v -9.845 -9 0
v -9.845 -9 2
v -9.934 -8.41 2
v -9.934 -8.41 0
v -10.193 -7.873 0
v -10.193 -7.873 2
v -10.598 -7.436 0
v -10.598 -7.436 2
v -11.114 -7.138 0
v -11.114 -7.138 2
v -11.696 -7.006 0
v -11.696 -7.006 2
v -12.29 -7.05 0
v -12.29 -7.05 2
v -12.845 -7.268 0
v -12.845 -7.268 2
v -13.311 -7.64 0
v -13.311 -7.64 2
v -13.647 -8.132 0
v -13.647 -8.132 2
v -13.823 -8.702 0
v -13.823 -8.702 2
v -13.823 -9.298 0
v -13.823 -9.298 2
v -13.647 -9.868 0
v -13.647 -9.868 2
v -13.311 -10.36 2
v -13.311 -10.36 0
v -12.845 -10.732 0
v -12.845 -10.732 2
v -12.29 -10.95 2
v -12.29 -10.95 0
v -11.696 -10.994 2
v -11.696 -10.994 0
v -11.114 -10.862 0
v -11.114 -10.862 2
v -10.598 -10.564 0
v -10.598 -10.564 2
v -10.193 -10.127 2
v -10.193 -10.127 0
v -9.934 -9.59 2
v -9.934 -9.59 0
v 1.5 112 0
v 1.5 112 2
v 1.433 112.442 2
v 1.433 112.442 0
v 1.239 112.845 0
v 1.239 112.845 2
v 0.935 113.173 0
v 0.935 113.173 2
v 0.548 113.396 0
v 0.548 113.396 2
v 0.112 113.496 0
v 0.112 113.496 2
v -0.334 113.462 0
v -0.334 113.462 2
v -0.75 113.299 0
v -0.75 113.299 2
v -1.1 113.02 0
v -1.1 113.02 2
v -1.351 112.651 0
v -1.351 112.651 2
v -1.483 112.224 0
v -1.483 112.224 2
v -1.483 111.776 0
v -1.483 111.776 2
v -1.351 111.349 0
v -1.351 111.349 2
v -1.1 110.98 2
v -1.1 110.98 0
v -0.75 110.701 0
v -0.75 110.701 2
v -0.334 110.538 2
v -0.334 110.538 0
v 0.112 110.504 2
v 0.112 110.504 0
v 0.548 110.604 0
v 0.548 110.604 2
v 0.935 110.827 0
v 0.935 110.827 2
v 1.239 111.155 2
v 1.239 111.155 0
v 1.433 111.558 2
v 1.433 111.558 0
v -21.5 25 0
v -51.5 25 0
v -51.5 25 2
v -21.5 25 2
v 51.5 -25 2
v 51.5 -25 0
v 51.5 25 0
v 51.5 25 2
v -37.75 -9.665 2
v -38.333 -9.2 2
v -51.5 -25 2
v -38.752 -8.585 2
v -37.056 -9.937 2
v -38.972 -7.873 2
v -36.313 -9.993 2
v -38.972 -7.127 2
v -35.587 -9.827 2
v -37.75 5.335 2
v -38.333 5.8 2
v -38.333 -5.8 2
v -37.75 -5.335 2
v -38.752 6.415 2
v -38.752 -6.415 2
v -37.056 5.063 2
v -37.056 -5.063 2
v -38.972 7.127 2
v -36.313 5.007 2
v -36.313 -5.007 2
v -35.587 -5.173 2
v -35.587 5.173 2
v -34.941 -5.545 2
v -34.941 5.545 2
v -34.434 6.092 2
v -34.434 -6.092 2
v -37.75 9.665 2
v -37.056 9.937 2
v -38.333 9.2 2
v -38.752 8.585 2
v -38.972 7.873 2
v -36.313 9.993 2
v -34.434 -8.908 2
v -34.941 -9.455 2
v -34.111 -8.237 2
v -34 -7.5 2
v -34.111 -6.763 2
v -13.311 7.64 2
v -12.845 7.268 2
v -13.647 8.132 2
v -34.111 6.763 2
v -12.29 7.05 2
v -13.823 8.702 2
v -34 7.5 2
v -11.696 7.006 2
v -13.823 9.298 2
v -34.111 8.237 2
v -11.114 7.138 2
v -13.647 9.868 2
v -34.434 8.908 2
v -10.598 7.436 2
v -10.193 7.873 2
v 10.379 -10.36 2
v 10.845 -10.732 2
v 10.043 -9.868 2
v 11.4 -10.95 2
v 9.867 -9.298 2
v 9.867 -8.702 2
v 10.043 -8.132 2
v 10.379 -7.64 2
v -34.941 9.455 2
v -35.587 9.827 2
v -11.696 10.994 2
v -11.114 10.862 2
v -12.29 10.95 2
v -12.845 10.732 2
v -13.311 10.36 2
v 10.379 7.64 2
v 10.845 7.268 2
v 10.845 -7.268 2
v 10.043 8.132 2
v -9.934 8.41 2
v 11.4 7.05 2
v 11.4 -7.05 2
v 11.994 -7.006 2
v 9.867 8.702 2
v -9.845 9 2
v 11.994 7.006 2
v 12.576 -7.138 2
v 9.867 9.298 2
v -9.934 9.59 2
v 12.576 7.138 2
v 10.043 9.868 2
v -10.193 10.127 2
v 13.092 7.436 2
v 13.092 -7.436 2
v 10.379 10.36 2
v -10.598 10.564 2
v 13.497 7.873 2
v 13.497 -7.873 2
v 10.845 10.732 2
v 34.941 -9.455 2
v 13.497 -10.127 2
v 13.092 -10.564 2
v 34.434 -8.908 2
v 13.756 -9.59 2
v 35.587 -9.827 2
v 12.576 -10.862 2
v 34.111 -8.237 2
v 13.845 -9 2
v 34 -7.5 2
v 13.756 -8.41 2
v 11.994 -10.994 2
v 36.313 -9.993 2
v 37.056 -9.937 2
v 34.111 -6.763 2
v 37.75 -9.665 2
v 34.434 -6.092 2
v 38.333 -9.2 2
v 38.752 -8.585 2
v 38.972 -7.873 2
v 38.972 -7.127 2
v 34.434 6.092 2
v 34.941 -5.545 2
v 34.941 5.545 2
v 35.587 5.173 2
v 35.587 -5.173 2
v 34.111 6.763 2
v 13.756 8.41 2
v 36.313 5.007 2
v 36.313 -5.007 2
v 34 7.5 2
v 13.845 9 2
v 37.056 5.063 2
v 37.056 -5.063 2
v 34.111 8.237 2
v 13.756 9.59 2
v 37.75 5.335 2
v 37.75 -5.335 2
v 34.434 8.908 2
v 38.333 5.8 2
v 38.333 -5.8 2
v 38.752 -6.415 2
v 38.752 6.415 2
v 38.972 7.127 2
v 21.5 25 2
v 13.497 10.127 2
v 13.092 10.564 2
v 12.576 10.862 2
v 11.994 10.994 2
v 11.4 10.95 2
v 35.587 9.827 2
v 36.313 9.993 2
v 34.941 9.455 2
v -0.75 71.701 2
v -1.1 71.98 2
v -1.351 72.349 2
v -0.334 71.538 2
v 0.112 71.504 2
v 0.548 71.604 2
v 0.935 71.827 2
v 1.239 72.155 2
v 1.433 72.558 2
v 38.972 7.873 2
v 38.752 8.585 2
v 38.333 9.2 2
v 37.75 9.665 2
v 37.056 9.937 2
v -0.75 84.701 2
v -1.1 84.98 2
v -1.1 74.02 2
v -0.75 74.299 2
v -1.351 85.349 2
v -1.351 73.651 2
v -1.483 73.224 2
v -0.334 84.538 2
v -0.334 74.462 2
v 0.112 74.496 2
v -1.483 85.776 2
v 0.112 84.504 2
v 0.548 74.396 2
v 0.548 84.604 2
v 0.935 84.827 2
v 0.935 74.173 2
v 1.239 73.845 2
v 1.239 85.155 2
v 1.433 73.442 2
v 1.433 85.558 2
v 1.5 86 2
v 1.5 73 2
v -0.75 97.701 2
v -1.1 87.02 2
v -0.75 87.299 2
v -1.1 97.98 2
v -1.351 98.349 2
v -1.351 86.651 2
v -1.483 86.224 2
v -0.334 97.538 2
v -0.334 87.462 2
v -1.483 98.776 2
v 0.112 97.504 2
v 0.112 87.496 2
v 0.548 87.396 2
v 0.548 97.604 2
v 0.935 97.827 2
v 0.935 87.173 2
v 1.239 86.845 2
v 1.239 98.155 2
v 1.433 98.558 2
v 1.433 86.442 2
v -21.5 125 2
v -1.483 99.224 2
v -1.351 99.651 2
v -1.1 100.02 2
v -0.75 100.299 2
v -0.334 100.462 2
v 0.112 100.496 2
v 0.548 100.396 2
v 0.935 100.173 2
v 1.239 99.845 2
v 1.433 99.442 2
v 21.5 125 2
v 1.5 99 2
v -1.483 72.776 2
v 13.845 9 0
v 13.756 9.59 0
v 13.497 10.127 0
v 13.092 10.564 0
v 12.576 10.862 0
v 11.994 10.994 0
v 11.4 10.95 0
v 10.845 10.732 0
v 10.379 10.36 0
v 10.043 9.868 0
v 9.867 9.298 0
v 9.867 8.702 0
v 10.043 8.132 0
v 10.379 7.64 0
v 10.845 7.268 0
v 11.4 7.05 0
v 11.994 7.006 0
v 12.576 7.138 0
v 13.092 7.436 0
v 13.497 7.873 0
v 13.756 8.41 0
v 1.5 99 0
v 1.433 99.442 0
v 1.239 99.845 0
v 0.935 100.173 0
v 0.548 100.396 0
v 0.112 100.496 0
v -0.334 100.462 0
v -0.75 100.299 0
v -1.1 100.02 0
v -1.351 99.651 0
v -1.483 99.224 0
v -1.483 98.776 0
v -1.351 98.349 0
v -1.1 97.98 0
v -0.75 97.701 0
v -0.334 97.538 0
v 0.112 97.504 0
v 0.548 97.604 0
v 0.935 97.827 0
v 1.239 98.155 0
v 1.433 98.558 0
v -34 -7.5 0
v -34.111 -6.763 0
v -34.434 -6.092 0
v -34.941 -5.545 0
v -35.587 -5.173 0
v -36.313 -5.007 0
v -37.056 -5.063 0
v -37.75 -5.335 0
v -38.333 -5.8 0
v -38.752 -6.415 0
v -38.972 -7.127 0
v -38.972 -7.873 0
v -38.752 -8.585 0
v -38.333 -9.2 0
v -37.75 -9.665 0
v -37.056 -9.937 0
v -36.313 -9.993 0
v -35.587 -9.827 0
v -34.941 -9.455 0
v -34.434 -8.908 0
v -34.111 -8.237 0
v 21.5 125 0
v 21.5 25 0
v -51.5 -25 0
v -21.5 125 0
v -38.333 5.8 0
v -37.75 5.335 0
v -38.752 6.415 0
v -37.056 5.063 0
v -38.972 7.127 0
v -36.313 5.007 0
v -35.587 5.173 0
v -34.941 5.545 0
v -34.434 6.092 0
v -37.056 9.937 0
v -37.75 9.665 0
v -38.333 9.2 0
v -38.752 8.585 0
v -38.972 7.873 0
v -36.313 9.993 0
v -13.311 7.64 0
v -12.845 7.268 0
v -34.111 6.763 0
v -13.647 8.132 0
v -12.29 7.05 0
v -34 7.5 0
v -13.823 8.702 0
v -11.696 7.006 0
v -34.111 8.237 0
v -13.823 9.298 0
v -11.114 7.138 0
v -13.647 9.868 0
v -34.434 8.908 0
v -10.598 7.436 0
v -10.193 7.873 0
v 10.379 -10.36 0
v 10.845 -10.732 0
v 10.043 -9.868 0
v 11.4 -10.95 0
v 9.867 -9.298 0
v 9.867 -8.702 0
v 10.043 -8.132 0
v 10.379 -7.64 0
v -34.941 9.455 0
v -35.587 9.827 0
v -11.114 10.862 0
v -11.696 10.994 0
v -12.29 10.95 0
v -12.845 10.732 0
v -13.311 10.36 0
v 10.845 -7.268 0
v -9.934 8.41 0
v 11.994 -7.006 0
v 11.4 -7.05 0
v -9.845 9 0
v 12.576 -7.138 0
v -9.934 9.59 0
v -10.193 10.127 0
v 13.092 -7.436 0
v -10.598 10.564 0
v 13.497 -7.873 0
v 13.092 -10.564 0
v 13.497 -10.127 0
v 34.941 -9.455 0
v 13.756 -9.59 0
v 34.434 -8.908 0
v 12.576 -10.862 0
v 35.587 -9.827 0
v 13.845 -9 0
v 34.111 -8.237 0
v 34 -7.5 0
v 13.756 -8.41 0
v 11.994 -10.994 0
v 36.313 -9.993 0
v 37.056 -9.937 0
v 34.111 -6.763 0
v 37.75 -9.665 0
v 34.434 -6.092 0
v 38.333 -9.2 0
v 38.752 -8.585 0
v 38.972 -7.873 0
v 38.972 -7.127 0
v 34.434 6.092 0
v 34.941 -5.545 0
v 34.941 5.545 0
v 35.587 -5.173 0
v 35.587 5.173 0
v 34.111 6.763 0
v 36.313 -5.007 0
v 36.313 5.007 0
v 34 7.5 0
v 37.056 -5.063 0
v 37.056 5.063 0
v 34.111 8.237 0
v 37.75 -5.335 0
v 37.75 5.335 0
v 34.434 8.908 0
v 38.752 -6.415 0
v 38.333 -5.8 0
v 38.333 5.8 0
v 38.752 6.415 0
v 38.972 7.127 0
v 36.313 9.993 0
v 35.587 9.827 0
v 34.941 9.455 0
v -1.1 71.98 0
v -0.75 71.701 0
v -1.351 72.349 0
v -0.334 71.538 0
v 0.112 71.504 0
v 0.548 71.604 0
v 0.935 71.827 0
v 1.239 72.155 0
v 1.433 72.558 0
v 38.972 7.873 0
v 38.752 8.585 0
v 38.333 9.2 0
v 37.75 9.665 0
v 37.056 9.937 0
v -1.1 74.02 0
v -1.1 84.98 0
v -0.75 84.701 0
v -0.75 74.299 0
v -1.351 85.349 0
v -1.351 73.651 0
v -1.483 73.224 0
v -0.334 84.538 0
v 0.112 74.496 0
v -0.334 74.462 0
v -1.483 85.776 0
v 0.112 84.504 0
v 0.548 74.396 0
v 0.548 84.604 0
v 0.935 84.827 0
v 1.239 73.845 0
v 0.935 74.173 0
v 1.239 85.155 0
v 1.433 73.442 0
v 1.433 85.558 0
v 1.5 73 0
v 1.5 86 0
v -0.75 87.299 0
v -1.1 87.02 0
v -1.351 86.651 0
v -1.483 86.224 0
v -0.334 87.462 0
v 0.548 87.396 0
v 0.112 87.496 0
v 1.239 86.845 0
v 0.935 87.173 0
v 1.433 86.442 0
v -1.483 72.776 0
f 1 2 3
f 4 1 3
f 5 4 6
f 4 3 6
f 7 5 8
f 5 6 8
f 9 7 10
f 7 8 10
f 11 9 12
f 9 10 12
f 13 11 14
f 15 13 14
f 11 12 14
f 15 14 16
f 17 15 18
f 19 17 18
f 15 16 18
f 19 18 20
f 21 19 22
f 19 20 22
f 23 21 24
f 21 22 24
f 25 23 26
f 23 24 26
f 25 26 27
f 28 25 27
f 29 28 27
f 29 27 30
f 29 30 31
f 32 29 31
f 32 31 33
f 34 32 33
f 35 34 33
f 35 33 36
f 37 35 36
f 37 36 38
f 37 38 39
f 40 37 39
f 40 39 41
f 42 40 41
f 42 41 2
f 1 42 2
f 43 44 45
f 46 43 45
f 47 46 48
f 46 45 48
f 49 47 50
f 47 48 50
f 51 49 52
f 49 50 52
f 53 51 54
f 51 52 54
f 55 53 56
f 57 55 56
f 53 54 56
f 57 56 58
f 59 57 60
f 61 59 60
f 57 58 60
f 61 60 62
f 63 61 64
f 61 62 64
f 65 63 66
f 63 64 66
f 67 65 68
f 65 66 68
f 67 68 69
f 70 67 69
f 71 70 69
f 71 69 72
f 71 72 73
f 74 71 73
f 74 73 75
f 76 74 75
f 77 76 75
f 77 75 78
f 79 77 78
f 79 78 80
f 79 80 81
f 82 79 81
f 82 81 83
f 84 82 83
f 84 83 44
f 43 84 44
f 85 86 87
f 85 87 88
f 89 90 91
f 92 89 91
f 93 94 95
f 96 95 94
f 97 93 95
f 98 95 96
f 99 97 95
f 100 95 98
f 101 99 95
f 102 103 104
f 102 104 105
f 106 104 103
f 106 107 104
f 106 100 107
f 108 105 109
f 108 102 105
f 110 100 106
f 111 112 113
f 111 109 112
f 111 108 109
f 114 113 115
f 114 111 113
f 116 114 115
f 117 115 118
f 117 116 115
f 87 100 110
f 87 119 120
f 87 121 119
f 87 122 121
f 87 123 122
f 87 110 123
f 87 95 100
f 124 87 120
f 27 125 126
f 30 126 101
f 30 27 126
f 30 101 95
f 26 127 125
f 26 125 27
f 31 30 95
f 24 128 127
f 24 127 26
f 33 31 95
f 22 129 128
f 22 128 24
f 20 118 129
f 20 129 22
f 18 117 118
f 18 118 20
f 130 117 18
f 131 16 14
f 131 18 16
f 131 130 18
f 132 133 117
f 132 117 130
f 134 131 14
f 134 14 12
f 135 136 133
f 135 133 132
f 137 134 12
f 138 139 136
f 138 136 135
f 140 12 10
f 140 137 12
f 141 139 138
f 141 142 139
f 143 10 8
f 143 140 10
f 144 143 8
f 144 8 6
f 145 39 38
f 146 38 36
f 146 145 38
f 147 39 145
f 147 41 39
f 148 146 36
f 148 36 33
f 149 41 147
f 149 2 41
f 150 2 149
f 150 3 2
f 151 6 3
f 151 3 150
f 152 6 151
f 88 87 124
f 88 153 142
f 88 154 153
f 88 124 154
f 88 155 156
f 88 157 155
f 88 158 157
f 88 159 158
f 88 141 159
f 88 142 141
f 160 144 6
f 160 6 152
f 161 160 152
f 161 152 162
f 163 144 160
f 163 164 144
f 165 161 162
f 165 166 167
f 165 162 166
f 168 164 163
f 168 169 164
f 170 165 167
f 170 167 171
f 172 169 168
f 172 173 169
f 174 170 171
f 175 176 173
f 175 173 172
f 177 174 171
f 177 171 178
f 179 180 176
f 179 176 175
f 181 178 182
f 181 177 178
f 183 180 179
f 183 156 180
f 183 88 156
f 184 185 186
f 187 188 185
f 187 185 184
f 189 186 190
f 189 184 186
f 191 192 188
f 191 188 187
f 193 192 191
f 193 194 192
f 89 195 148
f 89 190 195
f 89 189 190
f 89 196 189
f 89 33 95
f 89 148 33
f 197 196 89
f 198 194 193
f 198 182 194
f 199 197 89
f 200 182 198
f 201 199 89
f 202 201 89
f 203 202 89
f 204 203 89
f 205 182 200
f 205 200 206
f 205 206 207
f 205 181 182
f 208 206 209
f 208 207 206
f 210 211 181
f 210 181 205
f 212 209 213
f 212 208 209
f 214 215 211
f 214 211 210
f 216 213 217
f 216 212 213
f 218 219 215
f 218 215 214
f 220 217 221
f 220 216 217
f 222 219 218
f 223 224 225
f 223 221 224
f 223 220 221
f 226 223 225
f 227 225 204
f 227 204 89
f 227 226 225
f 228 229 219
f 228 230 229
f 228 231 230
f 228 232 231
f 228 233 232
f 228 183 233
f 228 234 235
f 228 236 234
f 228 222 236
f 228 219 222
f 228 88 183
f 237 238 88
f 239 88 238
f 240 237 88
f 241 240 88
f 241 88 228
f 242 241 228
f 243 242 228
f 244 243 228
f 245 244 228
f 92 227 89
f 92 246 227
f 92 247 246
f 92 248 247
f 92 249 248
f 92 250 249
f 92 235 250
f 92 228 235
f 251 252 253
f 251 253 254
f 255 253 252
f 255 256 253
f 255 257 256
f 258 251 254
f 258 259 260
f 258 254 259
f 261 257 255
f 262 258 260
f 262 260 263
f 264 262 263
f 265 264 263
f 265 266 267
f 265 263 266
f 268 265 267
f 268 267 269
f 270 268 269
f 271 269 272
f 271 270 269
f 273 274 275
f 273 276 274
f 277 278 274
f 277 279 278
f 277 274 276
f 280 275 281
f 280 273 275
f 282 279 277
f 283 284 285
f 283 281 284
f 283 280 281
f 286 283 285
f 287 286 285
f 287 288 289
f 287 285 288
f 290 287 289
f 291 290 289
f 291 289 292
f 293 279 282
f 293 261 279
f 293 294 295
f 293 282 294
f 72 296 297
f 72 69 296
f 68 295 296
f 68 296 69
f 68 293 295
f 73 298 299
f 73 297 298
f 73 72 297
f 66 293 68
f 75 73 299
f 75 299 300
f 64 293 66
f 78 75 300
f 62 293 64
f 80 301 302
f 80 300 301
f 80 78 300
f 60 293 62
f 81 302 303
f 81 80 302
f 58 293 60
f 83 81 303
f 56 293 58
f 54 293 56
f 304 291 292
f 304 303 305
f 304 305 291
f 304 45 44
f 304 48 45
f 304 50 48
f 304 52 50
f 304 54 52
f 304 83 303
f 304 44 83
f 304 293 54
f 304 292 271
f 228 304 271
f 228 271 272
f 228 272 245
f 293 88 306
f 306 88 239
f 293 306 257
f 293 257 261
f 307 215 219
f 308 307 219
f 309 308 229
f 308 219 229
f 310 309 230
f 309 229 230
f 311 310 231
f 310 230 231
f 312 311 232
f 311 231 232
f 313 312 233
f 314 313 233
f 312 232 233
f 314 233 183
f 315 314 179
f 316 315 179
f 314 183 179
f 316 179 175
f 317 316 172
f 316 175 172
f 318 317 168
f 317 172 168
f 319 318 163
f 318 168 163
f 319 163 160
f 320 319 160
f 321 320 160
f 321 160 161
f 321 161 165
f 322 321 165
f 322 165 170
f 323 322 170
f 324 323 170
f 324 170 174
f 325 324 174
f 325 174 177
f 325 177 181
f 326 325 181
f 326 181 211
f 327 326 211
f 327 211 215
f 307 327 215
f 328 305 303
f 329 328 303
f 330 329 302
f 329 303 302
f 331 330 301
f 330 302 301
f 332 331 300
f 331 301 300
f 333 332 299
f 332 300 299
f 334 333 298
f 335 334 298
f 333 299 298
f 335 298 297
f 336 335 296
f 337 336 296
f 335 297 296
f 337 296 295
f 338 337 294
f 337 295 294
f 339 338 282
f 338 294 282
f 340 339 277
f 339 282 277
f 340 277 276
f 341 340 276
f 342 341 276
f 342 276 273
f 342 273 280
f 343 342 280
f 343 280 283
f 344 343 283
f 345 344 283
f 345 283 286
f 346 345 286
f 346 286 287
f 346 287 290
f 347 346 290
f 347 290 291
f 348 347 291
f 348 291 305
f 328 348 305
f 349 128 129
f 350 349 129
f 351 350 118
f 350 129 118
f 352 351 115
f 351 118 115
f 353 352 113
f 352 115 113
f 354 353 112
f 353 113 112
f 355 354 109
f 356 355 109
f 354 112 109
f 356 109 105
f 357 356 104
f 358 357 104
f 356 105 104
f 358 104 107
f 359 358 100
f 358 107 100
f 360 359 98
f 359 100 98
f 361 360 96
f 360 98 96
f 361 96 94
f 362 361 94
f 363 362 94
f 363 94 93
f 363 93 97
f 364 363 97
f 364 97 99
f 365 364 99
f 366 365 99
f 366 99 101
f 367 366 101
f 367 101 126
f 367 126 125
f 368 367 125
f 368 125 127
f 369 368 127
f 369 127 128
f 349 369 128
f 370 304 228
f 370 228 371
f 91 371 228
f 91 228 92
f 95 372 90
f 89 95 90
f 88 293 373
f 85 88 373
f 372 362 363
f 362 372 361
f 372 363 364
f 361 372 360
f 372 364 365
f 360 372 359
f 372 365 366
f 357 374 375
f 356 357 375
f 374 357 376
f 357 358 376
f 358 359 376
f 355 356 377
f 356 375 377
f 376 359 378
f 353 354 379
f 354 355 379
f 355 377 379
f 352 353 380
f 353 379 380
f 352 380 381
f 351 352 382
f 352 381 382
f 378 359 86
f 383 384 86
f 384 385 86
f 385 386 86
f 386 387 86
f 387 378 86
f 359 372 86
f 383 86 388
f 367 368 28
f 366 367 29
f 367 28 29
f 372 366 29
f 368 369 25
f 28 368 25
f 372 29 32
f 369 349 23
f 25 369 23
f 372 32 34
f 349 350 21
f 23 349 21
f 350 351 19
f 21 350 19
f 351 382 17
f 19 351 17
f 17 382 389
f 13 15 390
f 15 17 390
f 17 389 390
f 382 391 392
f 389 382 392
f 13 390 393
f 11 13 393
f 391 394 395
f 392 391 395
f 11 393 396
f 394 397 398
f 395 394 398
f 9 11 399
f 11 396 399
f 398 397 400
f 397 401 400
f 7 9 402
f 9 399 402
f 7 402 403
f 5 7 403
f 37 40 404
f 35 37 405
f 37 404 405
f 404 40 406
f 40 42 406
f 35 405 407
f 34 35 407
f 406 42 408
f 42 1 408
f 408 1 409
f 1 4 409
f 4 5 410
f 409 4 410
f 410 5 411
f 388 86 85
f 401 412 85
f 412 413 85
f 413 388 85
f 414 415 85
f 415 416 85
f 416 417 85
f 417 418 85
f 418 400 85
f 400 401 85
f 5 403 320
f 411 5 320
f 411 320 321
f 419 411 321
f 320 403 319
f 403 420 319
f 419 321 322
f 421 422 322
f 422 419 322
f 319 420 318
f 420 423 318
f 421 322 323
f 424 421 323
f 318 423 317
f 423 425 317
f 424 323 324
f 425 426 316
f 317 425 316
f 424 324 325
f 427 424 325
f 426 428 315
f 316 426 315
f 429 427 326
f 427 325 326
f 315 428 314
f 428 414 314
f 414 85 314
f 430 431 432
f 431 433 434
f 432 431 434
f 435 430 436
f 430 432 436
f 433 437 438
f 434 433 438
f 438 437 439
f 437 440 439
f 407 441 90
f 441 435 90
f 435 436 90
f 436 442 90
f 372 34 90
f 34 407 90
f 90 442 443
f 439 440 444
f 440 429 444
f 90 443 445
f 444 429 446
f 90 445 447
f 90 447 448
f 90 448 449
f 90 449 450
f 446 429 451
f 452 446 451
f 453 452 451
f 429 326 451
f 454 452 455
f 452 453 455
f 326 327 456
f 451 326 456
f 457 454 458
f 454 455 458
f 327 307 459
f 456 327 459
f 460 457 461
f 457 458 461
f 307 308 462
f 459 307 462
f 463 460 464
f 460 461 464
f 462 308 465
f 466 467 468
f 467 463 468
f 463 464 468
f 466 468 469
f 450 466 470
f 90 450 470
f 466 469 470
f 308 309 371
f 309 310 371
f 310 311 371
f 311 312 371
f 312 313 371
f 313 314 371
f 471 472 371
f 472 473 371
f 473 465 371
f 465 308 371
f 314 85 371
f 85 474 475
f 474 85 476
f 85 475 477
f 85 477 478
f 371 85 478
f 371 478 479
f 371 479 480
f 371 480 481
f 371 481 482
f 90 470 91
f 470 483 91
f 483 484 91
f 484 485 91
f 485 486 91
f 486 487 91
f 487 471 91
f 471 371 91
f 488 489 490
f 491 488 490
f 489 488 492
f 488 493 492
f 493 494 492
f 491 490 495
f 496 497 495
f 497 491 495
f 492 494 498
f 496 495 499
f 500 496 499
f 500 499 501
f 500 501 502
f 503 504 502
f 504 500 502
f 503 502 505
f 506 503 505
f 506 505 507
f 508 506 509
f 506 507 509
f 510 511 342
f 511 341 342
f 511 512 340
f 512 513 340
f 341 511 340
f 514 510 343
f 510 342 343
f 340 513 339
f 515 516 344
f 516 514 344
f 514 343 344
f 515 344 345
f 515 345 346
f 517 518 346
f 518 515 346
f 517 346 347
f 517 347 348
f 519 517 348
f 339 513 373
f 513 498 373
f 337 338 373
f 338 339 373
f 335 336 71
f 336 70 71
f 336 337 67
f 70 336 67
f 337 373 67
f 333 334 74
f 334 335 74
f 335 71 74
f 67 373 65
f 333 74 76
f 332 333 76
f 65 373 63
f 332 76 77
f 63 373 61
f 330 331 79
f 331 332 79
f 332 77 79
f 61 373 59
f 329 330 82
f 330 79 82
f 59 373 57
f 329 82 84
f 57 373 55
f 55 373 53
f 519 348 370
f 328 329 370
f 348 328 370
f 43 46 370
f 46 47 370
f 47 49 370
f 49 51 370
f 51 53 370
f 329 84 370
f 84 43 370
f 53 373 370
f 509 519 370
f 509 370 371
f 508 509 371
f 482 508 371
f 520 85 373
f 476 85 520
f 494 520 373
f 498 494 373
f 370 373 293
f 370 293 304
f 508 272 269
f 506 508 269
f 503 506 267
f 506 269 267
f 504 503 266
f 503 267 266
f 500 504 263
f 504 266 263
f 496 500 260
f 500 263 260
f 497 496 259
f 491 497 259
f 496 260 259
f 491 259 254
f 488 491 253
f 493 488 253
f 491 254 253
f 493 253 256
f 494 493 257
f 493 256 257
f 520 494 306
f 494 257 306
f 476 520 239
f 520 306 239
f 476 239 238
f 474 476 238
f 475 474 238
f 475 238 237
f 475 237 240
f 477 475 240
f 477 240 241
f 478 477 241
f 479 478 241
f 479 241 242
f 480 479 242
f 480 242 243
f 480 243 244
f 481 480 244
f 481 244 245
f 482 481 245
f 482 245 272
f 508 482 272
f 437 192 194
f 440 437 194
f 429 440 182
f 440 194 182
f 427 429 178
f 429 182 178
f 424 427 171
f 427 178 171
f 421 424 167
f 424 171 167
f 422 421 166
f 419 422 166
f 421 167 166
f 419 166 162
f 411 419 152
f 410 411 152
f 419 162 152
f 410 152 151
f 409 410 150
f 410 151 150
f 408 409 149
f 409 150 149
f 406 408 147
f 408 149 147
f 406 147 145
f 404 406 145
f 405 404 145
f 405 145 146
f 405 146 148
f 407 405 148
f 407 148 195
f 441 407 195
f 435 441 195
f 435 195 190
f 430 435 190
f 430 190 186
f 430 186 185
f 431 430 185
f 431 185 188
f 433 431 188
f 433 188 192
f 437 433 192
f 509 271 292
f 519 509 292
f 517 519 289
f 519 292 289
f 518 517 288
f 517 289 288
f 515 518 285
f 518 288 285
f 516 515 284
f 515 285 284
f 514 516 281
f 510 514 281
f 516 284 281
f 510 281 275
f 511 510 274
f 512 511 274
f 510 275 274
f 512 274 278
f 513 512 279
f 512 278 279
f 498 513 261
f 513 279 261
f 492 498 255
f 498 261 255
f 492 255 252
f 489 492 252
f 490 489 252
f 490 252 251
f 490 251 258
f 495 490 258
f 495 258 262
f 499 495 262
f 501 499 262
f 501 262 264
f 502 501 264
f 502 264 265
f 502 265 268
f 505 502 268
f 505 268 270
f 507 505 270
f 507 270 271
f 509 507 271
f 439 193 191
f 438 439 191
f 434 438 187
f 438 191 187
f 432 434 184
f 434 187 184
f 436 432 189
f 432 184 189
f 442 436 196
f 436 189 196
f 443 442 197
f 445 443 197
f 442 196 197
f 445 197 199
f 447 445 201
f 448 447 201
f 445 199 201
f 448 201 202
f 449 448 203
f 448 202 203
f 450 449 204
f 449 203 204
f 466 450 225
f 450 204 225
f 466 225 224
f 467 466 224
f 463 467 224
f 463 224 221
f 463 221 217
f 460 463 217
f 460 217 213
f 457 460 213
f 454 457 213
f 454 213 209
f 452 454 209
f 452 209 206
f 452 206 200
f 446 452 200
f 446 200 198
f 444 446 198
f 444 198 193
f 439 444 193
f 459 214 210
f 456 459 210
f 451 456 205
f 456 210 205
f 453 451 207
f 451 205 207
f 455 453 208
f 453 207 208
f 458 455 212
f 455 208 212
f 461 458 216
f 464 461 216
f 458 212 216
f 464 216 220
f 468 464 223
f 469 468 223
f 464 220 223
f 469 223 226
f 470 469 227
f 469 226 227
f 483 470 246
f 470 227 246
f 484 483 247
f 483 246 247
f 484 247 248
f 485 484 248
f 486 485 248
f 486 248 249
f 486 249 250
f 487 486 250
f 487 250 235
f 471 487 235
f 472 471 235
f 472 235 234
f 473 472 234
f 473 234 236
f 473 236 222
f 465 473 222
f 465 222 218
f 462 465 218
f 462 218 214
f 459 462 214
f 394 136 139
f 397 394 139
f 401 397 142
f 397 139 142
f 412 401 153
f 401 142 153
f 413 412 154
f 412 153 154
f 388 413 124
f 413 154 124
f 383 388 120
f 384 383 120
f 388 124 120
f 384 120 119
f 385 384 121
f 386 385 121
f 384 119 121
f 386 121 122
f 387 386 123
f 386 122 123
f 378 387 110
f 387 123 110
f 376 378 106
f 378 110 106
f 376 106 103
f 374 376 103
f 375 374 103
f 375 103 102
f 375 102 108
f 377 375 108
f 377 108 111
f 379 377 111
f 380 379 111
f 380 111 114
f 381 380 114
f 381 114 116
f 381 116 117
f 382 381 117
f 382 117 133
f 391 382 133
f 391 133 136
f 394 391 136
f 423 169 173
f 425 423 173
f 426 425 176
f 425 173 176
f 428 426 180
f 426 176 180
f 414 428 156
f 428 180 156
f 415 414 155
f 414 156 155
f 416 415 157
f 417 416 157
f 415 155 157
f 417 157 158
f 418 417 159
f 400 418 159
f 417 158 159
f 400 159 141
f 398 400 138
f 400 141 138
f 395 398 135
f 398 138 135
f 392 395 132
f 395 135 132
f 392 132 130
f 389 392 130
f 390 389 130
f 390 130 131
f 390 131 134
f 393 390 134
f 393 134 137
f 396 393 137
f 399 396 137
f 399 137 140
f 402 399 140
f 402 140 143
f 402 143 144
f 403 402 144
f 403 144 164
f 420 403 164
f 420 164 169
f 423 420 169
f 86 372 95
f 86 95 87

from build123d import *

# Parameters (mm, degrees)
SKETCH1_W           = 103
SKETCH1_H           = 50
BOSS_EXTRUDE1_DEPTH = 2
SKETCH3_R           = 2
CUT_EXTRUDE1_DEPTH  = 7
SKETCH4_R           = 2.5
CUT_EXTRUDE2_DEPTH  = 7
SKETCH6_W           = 43
SKETCH6_H           = 2
BOSS_EXTRUDE3_DEPTH = 100
SKETCH7_R           = 1.5
CUT_EXTRUDE3_DEPTH  = 30


with BuildPart() as part:
    # Sketch1 → Boss-Extrude1 (new body)
    with BuildSketch(Plane.XY):
        Rectangle(SKETCH1_W, SKETCH1_H)
    extrude(amount=BOSS_EXTRUDE1_DEPTH)

    # Sketch3 → Cut-Extrude1 (cut)
    with BuildSketch(Plane.XY.offset(2)):
        with Locations((-11.845, 9)):
            Circle(SKETCH3_R)
        with Locations((-11.845, -9)):
            Circle(SKETCH3_R)
        with Locations((11.845, -9)):
            Circle(SKETCH3_R)
        with Locations((11.845, 9)):
            Circle(SKETCH3_R)
    extrude(amount=-CUT_EXTRUDE1_DEPTH, mode=Mode.SUBTRACT)

    # Sketch4 → Cut-Extrude2 (cut)
    with BuildSketch(Plane.XY.offset(2)):
        with Locations((-36.5, 7.5)):
            Circle(SKETCH4_R)
        with Locations((-36.5, -7.5)):
            Circle(SKETCH4_R)
        with Locations(Location((36.5, -7.5, 0), (0, 0, 180))):
            Circle(SKETCH4_R)
        with Locations(Location((36.5, 7.5, 0), (0, 0, 180))):
            Circle(SKETCH4_R)
    extrude(amount=-CUT_EXTRUDE2_DEPTH, mode=Mode.SUBTRACT)

    # Sketch6 → Boss-Extrude3 (add)
    with BuildSketch(Plane(origin=(0, 25, 0), x_dir=(1, 0, 0), z_dir=(0, 1, 0))):
        with Locations((0, -1)):
            Rectangle(SKETCH6_W, SKETCH6_H)
    extrude(amount=BOSS_EXTRUDE3_DEPTH)

    # Sketch7 → Cut-Extrude3 (cut)
    with BuildSketch(Plane.XY.offset(2)):
        with Locations((0, 112)):
            Circle(SKETCH7_R)
        with Locations((0, 99)):
            Circle(SKETCH7_R)
        with Locations((0, 86)):
            Circle(SKETCH7_R)
        with Locations((0, 73)):
            Circle(SKETCH7_R)
    extrude(amount=-CUT_EXTRUDE3_DEPTH, mode=Mode.SUBTRACT)


solid = part.part
